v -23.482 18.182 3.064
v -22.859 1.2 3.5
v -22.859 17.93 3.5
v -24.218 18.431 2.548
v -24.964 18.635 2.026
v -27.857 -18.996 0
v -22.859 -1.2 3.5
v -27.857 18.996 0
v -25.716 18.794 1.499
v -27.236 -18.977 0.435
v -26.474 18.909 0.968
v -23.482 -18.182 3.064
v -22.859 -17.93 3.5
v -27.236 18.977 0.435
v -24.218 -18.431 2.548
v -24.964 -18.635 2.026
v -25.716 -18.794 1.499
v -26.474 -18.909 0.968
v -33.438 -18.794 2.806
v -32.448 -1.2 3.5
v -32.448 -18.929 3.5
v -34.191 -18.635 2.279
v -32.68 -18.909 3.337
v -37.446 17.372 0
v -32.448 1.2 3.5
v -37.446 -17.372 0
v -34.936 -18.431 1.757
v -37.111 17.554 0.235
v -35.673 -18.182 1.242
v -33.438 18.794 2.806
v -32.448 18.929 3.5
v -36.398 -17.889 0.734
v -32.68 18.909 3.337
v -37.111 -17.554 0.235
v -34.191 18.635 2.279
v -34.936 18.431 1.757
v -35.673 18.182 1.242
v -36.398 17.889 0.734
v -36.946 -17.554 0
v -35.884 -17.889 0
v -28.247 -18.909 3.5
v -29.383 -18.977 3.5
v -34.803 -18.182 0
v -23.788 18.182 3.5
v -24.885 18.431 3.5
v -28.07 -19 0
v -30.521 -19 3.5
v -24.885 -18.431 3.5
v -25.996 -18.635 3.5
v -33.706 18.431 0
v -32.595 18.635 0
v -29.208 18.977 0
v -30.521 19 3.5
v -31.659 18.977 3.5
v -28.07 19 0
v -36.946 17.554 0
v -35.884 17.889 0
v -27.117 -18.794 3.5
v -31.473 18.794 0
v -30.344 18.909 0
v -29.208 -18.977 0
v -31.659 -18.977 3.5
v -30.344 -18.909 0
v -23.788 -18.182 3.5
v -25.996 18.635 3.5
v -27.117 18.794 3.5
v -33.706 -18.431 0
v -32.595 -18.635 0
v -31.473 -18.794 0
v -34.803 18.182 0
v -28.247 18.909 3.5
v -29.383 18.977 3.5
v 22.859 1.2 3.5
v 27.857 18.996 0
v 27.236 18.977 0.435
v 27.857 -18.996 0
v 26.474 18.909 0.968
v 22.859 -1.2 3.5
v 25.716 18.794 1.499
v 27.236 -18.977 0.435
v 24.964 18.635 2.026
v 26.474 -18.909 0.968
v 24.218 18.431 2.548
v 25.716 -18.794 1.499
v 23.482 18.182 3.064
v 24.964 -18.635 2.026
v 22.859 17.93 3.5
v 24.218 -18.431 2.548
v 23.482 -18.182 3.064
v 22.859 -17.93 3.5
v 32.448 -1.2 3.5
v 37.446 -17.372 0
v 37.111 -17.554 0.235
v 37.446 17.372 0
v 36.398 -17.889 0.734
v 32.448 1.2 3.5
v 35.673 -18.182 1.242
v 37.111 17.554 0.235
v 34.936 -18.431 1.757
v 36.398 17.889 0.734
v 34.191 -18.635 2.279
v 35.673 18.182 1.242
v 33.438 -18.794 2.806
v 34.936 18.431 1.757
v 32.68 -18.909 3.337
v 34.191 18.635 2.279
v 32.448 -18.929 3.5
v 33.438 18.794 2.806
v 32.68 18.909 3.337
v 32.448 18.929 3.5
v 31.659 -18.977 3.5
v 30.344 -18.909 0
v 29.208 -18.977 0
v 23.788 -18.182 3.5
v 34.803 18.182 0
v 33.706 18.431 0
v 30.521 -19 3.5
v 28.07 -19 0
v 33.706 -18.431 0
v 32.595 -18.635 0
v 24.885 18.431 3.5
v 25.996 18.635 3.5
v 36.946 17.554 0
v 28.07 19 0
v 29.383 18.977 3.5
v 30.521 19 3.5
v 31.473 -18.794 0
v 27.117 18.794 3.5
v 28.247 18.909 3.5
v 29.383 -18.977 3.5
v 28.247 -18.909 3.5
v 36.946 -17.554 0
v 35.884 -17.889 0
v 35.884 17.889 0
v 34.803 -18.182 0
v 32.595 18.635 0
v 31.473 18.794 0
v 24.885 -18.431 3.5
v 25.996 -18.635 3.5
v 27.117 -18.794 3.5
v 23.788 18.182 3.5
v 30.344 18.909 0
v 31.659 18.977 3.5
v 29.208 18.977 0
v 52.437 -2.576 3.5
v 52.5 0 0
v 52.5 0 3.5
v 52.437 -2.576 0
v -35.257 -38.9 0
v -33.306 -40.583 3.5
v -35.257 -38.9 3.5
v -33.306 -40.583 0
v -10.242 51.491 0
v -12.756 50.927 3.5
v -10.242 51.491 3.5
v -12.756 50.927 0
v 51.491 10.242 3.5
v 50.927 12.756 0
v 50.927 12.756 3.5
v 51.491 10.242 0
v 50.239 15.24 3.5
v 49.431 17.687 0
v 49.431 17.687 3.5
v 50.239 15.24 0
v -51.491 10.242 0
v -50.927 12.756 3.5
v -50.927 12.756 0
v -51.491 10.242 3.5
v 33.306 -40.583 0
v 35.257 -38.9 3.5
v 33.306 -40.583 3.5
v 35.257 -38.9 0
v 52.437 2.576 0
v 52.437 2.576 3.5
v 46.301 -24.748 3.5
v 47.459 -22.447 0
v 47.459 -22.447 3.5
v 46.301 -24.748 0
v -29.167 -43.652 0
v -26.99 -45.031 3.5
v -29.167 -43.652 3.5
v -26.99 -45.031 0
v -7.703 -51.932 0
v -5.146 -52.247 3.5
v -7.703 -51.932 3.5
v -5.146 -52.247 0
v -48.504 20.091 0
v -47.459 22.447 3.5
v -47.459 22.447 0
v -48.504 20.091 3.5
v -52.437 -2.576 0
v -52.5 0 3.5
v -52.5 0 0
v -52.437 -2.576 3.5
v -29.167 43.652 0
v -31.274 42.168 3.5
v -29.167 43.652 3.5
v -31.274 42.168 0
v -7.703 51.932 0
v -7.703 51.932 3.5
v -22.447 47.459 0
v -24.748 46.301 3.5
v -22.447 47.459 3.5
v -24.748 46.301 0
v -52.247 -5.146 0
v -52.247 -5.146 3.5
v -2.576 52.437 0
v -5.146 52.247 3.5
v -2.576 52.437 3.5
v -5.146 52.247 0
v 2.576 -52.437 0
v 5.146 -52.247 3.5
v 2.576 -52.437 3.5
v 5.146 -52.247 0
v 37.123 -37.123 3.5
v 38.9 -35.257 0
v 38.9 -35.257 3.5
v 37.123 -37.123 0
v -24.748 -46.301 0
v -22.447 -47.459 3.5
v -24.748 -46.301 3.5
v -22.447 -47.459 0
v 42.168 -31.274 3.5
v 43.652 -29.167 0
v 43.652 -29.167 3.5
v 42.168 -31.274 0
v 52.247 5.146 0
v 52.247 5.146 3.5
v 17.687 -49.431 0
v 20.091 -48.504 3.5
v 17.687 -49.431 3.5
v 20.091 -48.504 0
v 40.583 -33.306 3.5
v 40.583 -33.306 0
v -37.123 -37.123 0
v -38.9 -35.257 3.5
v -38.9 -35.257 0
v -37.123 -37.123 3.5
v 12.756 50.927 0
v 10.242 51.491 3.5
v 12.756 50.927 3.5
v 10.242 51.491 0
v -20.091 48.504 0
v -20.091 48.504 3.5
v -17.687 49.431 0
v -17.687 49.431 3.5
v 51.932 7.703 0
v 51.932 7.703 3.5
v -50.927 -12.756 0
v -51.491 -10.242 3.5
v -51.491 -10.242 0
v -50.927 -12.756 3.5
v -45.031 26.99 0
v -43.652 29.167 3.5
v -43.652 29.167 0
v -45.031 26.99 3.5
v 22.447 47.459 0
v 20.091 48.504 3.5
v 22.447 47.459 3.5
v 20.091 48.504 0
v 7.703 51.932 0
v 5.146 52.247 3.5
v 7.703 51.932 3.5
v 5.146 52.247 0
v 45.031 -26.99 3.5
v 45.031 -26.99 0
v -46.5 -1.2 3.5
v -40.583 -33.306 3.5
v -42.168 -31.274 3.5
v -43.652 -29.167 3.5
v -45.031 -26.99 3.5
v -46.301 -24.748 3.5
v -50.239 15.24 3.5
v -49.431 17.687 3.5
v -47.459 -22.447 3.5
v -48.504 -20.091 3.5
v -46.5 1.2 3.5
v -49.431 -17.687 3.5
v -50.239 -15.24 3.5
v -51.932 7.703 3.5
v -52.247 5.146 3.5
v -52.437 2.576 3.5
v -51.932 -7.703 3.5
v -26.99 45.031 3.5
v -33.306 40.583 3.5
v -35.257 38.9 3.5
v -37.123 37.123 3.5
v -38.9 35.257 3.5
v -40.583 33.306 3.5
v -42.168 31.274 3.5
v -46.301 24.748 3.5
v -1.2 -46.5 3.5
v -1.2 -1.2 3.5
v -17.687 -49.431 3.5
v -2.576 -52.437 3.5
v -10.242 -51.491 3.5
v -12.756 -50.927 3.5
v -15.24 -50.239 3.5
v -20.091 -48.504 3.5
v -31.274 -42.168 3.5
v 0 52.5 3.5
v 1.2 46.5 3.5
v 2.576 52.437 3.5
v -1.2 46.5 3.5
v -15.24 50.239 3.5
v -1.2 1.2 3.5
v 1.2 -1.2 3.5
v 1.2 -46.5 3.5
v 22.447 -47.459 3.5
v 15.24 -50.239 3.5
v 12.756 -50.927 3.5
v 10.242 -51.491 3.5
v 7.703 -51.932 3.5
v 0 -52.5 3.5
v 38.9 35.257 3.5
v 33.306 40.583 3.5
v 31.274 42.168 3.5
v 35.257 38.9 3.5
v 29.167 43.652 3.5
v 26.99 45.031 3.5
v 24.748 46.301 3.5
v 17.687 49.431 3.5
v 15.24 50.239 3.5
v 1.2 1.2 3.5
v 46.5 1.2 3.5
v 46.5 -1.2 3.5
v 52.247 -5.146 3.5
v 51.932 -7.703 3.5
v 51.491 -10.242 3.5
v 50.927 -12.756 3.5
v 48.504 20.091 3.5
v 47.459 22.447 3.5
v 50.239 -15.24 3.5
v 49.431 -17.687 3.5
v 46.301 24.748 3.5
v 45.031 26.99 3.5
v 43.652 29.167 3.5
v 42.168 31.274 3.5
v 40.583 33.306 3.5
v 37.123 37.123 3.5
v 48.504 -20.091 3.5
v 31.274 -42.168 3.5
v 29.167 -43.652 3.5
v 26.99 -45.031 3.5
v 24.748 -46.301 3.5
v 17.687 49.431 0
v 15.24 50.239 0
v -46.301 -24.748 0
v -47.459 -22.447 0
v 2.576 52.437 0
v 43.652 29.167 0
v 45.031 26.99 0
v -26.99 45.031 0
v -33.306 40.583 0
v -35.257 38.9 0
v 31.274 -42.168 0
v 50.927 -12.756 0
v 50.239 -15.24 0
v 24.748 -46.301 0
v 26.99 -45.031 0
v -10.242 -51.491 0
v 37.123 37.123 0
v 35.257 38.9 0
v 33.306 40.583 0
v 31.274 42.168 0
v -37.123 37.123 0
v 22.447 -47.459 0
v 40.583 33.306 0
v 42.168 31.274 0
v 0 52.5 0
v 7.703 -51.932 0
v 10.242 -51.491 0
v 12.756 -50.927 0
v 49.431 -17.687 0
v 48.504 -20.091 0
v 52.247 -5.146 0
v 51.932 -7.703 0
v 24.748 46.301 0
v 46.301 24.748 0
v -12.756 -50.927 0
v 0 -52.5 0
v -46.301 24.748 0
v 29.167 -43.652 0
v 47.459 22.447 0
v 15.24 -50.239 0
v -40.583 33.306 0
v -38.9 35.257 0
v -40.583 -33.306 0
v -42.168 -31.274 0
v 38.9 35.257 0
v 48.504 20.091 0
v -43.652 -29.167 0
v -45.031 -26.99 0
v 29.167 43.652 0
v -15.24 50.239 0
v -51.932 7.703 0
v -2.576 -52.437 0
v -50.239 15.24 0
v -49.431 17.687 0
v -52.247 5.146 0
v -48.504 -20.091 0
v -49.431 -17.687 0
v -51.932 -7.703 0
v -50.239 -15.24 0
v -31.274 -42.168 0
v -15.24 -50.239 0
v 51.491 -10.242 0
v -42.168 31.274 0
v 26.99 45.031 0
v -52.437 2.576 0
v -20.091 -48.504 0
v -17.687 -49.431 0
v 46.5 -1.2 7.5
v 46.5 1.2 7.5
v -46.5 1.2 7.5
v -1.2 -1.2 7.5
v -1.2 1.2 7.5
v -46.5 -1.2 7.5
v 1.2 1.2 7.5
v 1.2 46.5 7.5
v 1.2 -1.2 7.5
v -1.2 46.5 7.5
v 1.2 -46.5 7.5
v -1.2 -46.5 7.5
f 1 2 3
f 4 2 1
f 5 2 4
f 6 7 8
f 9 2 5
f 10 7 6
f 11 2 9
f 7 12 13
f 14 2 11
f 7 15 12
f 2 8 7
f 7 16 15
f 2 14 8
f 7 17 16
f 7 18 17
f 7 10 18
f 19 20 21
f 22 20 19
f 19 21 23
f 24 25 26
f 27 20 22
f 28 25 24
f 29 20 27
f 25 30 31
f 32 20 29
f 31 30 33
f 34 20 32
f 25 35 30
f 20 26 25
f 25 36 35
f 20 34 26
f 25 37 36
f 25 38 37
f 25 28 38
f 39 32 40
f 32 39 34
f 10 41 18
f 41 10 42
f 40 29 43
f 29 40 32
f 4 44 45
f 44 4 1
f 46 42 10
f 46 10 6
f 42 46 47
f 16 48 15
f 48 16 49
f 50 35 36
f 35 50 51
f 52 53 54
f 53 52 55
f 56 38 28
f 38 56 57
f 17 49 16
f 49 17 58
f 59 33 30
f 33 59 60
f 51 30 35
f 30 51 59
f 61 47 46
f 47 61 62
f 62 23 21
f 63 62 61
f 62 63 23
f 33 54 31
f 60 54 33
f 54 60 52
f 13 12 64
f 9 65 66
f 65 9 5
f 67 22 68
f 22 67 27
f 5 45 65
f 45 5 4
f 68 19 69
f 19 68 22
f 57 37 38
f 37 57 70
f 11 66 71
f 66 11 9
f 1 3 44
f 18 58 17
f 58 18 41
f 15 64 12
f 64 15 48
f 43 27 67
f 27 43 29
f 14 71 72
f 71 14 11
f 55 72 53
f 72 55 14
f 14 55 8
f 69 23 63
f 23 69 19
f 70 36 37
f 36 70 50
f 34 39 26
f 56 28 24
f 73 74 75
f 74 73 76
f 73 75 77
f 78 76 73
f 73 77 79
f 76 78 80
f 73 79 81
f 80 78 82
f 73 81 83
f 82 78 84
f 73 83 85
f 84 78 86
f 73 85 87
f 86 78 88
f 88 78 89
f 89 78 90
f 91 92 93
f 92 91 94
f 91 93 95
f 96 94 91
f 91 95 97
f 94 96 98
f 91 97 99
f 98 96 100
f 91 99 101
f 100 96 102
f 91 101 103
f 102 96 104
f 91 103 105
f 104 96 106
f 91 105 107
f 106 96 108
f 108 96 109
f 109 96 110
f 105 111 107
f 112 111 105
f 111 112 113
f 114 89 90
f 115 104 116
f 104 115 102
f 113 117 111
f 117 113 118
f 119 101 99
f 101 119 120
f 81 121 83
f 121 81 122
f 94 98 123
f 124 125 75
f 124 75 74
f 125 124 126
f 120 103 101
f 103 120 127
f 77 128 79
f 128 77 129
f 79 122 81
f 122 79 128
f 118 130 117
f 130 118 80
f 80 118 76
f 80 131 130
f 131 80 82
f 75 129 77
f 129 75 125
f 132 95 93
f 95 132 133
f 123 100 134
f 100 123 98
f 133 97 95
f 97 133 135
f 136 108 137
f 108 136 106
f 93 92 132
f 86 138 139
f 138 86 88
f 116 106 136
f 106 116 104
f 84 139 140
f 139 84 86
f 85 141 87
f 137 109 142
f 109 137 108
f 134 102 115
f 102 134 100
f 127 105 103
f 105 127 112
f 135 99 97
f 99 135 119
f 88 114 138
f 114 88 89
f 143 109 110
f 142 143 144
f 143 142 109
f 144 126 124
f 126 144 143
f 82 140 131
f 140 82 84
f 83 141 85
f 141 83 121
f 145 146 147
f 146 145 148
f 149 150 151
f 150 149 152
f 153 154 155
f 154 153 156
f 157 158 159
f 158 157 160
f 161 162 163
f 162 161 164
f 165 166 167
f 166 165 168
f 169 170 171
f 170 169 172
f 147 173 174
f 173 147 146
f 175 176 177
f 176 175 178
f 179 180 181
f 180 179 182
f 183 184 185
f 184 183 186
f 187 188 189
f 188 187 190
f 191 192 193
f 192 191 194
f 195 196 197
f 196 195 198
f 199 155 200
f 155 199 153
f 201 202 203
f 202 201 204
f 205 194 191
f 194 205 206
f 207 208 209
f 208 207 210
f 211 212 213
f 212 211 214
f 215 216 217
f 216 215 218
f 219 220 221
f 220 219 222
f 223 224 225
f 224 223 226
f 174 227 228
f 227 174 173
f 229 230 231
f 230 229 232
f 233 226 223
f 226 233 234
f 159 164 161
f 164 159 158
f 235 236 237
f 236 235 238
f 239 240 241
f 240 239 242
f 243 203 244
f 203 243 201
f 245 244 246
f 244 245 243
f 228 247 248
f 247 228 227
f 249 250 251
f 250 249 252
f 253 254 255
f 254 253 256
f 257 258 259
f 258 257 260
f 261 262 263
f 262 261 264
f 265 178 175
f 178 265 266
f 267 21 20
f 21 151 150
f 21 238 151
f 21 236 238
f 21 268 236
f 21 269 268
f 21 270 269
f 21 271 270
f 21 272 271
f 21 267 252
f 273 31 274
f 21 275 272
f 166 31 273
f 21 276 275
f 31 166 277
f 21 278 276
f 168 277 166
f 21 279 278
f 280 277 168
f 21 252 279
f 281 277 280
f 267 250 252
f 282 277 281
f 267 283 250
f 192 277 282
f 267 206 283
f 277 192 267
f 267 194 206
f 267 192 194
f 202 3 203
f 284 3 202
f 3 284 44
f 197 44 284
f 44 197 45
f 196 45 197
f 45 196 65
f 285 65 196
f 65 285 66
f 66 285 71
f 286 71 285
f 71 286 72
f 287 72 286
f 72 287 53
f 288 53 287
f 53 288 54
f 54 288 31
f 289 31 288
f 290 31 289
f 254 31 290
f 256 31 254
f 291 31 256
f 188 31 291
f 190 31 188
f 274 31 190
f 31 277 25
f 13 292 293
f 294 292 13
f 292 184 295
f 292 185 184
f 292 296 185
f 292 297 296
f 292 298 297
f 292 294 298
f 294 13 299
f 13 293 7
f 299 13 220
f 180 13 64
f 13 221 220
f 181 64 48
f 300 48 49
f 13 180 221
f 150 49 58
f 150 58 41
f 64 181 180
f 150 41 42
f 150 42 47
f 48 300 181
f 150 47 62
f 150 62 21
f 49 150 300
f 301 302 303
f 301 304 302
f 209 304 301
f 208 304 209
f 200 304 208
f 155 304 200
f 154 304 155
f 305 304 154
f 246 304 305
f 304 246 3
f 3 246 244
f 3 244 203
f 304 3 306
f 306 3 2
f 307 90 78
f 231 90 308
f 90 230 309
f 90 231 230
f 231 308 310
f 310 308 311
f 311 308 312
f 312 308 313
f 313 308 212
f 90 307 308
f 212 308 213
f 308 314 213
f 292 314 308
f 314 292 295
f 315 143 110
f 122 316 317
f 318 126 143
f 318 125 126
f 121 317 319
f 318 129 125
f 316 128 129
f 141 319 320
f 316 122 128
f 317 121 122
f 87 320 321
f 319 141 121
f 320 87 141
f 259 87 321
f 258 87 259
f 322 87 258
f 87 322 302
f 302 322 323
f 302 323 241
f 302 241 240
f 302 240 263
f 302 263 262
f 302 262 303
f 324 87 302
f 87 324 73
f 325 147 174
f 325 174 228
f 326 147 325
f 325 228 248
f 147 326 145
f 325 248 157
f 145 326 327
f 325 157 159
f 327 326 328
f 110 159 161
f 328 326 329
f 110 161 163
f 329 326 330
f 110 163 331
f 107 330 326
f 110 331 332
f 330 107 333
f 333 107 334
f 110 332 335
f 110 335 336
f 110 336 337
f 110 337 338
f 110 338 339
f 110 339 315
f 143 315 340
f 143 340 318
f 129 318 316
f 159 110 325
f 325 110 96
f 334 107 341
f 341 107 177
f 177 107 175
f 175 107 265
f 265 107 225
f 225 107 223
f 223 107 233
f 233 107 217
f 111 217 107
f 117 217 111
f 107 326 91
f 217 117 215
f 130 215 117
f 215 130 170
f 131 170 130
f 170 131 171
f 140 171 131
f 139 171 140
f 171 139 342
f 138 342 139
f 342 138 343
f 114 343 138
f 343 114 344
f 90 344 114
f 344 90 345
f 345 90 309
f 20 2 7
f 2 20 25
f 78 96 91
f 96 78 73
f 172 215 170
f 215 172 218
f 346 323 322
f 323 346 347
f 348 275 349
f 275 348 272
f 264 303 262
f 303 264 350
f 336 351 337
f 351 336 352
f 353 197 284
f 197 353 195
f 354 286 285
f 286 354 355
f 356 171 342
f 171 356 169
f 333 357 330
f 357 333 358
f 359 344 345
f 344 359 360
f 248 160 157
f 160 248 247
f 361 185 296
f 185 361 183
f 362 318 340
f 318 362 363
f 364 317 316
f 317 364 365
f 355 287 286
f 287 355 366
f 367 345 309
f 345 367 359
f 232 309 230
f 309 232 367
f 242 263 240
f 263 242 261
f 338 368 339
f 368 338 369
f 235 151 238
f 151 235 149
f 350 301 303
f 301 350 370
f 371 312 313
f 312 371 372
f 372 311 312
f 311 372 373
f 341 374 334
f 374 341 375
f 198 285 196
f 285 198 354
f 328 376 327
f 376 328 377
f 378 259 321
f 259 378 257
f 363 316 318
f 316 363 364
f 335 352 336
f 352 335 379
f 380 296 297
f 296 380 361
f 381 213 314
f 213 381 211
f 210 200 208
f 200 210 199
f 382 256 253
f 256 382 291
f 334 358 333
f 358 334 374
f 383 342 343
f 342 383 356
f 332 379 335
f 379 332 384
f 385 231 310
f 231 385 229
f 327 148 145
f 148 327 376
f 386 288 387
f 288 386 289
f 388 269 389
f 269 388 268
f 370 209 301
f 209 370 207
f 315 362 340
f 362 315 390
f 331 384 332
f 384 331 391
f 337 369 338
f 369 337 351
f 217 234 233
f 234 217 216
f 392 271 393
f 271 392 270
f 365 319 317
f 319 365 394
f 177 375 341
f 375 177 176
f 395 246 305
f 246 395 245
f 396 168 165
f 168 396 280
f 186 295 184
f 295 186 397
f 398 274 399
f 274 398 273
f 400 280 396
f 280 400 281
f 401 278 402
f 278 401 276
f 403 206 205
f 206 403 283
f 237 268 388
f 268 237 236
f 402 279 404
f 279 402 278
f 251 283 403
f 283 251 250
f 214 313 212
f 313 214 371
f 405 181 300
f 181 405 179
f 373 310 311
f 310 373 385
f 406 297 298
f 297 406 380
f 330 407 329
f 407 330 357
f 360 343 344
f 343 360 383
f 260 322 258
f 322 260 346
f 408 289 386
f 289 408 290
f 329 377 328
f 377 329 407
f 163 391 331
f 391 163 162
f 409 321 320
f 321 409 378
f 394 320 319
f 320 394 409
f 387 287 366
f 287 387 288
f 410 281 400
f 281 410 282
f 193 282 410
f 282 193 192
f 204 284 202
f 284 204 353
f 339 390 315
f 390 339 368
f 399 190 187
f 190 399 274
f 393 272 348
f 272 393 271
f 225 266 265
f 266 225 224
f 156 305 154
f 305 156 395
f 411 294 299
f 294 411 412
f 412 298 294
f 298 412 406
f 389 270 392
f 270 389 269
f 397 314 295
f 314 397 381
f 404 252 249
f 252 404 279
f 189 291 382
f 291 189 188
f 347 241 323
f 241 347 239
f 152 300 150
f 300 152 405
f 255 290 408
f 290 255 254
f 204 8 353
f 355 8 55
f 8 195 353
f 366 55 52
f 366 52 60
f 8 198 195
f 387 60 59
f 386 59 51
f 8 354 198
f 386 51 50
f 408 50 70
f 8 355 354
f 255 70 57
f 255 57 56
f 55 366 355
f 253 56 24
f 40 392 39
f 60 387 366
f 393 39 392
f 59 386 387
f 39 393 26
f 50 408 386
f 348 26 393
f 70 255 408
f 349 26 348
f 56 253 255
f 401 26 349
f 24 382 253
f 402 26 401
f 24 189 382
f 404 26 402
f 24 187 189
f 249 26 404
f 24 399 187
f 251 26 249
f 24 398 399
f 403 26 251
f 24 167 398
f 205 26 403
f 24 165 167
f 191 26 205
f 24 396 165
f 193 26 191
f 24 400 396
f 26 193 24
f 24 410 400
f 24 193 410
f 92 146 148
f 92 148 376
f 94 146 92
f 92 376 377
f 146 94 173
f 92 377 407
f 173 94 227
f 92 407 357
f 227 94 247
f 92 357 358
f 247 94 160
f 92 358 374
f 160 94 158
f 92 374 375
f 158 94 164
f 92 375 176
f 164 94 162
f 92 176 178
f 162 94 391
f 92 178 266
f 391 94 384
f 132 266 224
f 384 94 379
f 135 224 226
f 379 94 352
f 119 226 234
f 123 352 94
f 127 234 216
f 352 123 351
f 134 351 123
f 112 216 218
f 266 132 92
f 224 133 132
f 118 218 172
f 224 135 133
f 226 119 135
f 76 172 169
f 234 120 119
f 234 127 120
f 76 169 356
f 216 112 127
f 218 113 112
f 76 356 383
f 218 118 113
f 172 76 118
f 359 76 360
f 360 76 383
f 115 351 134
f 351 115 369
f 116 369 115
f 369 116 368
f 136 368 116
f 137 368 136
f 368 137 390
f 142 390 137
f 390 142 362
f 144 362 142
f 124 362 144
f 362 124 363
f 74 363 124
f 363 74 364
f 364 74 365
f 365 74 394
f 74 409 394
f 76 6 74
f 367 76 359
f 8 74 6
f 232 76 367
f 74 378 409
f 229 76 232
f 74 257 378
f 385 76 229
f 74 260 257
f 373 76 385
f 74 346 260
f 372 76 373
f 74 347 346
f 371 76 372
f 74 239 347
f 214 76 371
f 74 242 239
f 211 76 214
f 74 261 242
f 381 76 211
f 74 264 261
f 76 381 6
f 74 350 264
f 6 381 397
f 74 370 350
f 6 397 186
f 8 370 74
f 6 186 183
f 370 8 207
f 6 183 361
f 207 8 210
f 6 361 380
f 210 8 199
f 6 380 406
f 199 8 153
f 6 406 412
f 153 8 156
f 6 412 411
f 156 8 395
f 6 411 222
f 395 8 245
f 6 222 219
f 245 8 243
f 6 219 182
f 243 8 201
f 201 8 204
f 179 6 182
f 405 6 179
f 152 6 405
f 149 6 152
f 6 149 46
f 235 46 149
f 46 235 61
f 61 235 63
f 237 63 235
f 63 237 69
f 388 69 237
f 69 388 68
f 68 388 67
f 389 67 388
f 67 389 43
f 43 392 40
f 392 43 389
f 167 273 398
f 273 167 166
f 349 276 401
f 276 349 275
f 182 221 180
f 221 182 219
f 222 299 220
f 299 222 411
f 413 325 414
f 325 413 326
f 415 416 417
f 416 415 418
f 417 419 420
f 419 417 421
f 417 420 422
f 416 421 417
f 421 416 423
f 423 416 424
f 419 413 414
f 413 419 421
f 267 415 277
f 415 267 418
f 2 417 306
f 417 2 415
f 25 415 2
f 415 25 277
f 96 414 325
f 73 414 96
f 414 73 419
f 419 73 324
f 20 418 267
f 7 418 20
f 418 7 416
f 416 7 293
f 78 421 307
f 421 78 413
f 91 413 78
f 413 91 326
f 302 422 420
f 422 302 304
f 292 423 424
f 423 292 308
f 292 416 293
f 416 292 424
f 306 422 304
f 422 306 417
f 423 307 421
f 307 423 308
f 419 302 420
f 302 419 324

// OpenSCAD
// ============================================================
// S3 Salle de Bain - Boitier voice assistant
// Piece : BAFFLE STEREO (support haut-parleurs 40 mm)
// Auteur : Hanafi BENMESBAH / domokami
// ============================================================

$fn = 128;

plate_d = 105;
plate_thickness = 3.5;
speaker_d = 38;        // diametre interieur cone
speaker_flange_d = 42; // diametre exterieur membrane
speaker_tilt = 35;     // degres d'inclinaison
speaker_offset = 28;
screw_d = 2.6;
screw_circle_d = 40;

module speaker_cutout() {
    cylinder(d = speaker_d, h = plate_thickness + 2, center = false);
    // 4 trous de vis
    for (a = [45, 135, 225, 315]) {
        rotate([0,0,a])
            translate([screw_circle_d/2, 0, 0])
                cylinder(d = screw_d, h = plate_thickness + 2);
    }
}

module ribbed_plate() {
    difference() {
        cylinder(d = plate_d, h = plate_thickness);
        // Decoupes speakers inclines gauche et droite
        for (s = [-1, 1]) {
            translate([s*speaker_offset, 0, -0.1])
                rotate([0, s*speaker_tilt, 0])
                    speaker_cutout();
        }
    }

    // Nervures de rigidification (croix)
    for (a = [0, 90]) {
        rotate([0,0,a])
            translate([-plate_d/2 + 6, -1.2, plate_thickness])
                cube([plate_d - 12, 2.4, 4]);
    }
}

ribbed_plate();
